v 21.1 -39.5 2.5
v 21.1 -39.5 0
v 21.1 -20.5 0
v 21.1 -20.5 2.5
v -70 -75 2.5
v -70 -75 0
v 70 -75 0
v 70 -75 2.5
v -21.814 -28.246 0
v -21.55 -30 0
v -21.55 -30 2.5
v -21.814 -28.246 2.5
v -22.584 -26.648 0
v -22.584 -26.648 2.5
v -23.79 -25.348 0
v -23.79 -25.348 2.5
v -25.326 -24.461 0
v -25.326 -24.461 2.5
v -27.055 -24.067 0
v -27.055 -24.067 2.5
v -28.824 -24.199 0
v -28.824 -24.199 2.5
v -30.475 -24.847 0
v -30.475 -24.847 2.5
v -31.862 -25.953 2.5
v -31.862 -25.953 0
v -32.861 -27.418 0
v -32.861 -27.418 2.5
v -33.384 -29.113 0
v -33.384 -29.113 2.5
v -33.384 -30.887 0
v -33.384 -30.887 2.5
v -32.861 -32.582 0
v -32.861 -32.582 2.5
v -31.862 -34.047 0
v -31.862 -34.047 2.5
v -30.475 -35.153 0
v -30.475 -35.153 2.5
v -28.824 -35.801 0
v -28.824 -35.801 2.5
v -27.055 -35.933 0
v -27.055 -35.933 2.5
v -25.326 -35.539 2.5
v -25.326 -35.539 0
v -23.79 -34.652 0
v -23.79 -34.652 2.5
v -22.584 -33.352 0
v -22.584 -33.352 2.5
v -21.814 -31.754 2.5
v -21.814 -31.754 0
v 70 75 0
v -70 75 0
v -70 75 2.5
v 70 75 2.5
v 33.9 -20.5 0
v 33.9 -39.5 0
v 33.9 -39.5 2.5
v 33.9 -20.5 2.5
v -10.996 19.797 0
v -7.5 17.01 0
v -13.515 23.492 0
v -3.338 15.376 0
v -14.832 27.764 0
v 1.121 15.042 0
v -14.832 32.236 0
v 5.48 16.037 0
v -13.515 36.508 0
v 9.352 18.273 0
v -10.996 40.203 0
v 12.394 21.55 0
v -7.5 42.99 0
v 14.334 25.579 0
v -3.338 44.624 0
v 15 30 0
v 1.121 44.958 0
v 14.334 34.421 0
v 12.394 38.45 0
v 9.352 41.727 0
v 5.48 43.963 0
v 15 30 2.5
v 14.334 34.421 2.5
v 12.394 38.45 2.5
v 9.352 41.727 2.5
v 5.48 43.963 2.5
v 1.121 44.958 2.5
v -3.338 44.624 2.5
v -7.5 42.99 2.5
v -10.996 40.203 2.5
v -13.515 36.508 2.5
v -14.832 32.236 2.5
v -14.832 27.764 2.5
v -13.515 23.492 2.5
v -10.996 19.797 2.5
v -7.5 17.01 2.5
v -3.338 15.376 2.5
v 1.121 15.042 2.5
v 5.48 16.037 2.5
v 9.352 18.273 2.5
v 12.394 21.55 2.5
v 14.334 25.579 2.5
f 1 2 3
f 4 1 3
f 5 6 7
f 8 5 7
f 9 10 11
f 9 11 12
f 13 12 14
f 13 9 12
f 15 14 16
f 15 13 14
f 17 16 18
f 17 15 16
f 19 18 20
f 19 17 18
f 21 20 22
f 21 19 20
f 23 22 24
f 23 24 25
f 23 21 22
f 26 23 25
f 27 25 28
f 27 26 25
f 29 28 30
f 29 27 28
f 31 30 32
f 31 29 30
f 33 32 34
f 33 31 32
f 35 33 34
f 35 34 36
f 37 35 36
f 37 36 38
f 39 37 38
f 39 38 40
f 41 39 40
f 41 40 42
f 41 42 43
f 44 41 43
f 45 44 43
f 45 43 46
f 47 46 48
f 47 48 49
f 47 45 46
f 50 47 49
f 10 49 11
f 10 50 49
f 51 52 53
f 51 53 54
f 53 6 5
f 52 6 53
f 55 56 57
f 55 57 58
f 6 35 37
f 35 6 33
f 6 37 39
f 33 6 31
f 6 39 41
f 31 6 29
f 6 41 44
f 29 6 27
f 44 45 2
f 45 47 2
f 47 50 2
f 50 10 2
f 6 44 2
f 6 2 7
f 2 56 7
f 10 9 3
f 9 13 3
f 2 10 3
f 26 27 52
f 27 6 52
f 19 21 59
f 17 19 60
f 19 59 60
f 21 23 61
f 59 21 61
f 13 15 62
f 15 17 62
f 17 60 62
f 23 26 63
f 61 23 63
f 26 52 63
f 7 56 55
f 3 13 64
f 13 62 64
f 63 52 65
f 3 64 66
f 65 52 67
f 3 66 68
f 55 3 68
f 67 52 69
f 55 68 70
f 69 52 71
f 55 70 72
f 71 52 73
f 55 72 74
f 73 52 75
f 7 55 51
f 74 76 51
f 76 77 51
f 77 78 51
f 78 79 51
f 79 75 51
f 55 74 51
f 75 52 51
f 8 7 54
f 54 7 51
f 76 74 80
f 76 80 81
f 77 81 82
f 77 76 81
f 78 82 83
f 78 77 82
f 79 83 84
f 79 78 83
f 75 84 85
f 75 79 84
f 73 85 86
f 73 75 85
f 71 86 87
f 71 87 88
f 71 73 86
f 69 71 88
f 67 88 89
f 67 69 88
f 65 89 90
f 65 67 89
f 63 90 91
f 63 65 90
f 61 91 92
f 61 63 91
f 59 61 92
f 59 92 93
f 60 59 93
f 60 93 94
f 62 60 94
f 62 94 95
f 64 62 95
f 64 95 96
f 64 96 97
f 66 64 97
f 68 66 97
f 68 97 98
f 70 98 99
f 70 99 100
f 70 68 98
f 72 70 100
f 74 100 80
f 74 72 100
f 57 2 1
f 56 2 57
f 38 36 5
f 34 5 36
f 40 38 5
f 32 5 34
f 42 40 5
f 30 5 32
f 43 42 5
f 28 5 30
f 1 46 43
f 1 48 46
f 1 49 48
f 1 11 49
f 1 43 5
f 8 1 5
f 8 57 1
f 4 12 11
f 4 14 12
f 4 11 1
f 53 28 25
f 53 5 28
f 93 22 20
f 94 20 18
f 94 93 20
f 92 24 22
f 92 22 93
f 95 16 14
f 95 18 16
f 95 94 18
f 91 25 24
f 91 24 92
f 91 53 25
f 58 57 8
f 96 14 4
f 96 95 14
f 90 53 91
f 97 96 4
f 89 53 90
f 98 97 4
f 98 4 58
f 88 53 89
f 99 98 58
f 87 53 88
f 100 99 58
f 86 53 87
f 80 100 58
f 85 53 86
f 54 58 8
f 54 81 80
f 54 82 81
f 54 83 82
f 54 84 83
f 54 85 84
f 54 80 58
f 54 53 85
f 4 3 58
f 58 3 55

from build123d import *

# Parameters (mm, degrees)
CROQUIS1_W              = 140
CROQUIS1_H              = 150
CROQUIS1_R              = 5.95
CROQUIS1_R_2            = 15
CROQUIS1_W_2            = 12.8
CROQUIS1_H_2            = 19
SALIENTE_EXTRUIR1_DEPTH = 2.5


with BuildPart() as part:
    # Croquis1 → Saliente-Extruir1 (new body)
    with BuildSketch(Plane.XY):
        Rectangle(CROQUIS1_W, CROQUIS1_H)
        with Locations((-27.5, -30)):
            Circle(CROQUIS1_R, mode=Mode.SUBTRACT)
        with Locations((0, 30)):
            Circle(CROQUIS1_R_2, mode=Mode.SUBTRACT)
        with Locations((27.5, -30)):
            Rectangle(CROQUIS1_W_2, CROQUIS1_H_2, mode=Mode.SUBTRACT)
    extrude(amount=SALIENTE_EXTRUIR1_DEPTH)


solid = part.part
